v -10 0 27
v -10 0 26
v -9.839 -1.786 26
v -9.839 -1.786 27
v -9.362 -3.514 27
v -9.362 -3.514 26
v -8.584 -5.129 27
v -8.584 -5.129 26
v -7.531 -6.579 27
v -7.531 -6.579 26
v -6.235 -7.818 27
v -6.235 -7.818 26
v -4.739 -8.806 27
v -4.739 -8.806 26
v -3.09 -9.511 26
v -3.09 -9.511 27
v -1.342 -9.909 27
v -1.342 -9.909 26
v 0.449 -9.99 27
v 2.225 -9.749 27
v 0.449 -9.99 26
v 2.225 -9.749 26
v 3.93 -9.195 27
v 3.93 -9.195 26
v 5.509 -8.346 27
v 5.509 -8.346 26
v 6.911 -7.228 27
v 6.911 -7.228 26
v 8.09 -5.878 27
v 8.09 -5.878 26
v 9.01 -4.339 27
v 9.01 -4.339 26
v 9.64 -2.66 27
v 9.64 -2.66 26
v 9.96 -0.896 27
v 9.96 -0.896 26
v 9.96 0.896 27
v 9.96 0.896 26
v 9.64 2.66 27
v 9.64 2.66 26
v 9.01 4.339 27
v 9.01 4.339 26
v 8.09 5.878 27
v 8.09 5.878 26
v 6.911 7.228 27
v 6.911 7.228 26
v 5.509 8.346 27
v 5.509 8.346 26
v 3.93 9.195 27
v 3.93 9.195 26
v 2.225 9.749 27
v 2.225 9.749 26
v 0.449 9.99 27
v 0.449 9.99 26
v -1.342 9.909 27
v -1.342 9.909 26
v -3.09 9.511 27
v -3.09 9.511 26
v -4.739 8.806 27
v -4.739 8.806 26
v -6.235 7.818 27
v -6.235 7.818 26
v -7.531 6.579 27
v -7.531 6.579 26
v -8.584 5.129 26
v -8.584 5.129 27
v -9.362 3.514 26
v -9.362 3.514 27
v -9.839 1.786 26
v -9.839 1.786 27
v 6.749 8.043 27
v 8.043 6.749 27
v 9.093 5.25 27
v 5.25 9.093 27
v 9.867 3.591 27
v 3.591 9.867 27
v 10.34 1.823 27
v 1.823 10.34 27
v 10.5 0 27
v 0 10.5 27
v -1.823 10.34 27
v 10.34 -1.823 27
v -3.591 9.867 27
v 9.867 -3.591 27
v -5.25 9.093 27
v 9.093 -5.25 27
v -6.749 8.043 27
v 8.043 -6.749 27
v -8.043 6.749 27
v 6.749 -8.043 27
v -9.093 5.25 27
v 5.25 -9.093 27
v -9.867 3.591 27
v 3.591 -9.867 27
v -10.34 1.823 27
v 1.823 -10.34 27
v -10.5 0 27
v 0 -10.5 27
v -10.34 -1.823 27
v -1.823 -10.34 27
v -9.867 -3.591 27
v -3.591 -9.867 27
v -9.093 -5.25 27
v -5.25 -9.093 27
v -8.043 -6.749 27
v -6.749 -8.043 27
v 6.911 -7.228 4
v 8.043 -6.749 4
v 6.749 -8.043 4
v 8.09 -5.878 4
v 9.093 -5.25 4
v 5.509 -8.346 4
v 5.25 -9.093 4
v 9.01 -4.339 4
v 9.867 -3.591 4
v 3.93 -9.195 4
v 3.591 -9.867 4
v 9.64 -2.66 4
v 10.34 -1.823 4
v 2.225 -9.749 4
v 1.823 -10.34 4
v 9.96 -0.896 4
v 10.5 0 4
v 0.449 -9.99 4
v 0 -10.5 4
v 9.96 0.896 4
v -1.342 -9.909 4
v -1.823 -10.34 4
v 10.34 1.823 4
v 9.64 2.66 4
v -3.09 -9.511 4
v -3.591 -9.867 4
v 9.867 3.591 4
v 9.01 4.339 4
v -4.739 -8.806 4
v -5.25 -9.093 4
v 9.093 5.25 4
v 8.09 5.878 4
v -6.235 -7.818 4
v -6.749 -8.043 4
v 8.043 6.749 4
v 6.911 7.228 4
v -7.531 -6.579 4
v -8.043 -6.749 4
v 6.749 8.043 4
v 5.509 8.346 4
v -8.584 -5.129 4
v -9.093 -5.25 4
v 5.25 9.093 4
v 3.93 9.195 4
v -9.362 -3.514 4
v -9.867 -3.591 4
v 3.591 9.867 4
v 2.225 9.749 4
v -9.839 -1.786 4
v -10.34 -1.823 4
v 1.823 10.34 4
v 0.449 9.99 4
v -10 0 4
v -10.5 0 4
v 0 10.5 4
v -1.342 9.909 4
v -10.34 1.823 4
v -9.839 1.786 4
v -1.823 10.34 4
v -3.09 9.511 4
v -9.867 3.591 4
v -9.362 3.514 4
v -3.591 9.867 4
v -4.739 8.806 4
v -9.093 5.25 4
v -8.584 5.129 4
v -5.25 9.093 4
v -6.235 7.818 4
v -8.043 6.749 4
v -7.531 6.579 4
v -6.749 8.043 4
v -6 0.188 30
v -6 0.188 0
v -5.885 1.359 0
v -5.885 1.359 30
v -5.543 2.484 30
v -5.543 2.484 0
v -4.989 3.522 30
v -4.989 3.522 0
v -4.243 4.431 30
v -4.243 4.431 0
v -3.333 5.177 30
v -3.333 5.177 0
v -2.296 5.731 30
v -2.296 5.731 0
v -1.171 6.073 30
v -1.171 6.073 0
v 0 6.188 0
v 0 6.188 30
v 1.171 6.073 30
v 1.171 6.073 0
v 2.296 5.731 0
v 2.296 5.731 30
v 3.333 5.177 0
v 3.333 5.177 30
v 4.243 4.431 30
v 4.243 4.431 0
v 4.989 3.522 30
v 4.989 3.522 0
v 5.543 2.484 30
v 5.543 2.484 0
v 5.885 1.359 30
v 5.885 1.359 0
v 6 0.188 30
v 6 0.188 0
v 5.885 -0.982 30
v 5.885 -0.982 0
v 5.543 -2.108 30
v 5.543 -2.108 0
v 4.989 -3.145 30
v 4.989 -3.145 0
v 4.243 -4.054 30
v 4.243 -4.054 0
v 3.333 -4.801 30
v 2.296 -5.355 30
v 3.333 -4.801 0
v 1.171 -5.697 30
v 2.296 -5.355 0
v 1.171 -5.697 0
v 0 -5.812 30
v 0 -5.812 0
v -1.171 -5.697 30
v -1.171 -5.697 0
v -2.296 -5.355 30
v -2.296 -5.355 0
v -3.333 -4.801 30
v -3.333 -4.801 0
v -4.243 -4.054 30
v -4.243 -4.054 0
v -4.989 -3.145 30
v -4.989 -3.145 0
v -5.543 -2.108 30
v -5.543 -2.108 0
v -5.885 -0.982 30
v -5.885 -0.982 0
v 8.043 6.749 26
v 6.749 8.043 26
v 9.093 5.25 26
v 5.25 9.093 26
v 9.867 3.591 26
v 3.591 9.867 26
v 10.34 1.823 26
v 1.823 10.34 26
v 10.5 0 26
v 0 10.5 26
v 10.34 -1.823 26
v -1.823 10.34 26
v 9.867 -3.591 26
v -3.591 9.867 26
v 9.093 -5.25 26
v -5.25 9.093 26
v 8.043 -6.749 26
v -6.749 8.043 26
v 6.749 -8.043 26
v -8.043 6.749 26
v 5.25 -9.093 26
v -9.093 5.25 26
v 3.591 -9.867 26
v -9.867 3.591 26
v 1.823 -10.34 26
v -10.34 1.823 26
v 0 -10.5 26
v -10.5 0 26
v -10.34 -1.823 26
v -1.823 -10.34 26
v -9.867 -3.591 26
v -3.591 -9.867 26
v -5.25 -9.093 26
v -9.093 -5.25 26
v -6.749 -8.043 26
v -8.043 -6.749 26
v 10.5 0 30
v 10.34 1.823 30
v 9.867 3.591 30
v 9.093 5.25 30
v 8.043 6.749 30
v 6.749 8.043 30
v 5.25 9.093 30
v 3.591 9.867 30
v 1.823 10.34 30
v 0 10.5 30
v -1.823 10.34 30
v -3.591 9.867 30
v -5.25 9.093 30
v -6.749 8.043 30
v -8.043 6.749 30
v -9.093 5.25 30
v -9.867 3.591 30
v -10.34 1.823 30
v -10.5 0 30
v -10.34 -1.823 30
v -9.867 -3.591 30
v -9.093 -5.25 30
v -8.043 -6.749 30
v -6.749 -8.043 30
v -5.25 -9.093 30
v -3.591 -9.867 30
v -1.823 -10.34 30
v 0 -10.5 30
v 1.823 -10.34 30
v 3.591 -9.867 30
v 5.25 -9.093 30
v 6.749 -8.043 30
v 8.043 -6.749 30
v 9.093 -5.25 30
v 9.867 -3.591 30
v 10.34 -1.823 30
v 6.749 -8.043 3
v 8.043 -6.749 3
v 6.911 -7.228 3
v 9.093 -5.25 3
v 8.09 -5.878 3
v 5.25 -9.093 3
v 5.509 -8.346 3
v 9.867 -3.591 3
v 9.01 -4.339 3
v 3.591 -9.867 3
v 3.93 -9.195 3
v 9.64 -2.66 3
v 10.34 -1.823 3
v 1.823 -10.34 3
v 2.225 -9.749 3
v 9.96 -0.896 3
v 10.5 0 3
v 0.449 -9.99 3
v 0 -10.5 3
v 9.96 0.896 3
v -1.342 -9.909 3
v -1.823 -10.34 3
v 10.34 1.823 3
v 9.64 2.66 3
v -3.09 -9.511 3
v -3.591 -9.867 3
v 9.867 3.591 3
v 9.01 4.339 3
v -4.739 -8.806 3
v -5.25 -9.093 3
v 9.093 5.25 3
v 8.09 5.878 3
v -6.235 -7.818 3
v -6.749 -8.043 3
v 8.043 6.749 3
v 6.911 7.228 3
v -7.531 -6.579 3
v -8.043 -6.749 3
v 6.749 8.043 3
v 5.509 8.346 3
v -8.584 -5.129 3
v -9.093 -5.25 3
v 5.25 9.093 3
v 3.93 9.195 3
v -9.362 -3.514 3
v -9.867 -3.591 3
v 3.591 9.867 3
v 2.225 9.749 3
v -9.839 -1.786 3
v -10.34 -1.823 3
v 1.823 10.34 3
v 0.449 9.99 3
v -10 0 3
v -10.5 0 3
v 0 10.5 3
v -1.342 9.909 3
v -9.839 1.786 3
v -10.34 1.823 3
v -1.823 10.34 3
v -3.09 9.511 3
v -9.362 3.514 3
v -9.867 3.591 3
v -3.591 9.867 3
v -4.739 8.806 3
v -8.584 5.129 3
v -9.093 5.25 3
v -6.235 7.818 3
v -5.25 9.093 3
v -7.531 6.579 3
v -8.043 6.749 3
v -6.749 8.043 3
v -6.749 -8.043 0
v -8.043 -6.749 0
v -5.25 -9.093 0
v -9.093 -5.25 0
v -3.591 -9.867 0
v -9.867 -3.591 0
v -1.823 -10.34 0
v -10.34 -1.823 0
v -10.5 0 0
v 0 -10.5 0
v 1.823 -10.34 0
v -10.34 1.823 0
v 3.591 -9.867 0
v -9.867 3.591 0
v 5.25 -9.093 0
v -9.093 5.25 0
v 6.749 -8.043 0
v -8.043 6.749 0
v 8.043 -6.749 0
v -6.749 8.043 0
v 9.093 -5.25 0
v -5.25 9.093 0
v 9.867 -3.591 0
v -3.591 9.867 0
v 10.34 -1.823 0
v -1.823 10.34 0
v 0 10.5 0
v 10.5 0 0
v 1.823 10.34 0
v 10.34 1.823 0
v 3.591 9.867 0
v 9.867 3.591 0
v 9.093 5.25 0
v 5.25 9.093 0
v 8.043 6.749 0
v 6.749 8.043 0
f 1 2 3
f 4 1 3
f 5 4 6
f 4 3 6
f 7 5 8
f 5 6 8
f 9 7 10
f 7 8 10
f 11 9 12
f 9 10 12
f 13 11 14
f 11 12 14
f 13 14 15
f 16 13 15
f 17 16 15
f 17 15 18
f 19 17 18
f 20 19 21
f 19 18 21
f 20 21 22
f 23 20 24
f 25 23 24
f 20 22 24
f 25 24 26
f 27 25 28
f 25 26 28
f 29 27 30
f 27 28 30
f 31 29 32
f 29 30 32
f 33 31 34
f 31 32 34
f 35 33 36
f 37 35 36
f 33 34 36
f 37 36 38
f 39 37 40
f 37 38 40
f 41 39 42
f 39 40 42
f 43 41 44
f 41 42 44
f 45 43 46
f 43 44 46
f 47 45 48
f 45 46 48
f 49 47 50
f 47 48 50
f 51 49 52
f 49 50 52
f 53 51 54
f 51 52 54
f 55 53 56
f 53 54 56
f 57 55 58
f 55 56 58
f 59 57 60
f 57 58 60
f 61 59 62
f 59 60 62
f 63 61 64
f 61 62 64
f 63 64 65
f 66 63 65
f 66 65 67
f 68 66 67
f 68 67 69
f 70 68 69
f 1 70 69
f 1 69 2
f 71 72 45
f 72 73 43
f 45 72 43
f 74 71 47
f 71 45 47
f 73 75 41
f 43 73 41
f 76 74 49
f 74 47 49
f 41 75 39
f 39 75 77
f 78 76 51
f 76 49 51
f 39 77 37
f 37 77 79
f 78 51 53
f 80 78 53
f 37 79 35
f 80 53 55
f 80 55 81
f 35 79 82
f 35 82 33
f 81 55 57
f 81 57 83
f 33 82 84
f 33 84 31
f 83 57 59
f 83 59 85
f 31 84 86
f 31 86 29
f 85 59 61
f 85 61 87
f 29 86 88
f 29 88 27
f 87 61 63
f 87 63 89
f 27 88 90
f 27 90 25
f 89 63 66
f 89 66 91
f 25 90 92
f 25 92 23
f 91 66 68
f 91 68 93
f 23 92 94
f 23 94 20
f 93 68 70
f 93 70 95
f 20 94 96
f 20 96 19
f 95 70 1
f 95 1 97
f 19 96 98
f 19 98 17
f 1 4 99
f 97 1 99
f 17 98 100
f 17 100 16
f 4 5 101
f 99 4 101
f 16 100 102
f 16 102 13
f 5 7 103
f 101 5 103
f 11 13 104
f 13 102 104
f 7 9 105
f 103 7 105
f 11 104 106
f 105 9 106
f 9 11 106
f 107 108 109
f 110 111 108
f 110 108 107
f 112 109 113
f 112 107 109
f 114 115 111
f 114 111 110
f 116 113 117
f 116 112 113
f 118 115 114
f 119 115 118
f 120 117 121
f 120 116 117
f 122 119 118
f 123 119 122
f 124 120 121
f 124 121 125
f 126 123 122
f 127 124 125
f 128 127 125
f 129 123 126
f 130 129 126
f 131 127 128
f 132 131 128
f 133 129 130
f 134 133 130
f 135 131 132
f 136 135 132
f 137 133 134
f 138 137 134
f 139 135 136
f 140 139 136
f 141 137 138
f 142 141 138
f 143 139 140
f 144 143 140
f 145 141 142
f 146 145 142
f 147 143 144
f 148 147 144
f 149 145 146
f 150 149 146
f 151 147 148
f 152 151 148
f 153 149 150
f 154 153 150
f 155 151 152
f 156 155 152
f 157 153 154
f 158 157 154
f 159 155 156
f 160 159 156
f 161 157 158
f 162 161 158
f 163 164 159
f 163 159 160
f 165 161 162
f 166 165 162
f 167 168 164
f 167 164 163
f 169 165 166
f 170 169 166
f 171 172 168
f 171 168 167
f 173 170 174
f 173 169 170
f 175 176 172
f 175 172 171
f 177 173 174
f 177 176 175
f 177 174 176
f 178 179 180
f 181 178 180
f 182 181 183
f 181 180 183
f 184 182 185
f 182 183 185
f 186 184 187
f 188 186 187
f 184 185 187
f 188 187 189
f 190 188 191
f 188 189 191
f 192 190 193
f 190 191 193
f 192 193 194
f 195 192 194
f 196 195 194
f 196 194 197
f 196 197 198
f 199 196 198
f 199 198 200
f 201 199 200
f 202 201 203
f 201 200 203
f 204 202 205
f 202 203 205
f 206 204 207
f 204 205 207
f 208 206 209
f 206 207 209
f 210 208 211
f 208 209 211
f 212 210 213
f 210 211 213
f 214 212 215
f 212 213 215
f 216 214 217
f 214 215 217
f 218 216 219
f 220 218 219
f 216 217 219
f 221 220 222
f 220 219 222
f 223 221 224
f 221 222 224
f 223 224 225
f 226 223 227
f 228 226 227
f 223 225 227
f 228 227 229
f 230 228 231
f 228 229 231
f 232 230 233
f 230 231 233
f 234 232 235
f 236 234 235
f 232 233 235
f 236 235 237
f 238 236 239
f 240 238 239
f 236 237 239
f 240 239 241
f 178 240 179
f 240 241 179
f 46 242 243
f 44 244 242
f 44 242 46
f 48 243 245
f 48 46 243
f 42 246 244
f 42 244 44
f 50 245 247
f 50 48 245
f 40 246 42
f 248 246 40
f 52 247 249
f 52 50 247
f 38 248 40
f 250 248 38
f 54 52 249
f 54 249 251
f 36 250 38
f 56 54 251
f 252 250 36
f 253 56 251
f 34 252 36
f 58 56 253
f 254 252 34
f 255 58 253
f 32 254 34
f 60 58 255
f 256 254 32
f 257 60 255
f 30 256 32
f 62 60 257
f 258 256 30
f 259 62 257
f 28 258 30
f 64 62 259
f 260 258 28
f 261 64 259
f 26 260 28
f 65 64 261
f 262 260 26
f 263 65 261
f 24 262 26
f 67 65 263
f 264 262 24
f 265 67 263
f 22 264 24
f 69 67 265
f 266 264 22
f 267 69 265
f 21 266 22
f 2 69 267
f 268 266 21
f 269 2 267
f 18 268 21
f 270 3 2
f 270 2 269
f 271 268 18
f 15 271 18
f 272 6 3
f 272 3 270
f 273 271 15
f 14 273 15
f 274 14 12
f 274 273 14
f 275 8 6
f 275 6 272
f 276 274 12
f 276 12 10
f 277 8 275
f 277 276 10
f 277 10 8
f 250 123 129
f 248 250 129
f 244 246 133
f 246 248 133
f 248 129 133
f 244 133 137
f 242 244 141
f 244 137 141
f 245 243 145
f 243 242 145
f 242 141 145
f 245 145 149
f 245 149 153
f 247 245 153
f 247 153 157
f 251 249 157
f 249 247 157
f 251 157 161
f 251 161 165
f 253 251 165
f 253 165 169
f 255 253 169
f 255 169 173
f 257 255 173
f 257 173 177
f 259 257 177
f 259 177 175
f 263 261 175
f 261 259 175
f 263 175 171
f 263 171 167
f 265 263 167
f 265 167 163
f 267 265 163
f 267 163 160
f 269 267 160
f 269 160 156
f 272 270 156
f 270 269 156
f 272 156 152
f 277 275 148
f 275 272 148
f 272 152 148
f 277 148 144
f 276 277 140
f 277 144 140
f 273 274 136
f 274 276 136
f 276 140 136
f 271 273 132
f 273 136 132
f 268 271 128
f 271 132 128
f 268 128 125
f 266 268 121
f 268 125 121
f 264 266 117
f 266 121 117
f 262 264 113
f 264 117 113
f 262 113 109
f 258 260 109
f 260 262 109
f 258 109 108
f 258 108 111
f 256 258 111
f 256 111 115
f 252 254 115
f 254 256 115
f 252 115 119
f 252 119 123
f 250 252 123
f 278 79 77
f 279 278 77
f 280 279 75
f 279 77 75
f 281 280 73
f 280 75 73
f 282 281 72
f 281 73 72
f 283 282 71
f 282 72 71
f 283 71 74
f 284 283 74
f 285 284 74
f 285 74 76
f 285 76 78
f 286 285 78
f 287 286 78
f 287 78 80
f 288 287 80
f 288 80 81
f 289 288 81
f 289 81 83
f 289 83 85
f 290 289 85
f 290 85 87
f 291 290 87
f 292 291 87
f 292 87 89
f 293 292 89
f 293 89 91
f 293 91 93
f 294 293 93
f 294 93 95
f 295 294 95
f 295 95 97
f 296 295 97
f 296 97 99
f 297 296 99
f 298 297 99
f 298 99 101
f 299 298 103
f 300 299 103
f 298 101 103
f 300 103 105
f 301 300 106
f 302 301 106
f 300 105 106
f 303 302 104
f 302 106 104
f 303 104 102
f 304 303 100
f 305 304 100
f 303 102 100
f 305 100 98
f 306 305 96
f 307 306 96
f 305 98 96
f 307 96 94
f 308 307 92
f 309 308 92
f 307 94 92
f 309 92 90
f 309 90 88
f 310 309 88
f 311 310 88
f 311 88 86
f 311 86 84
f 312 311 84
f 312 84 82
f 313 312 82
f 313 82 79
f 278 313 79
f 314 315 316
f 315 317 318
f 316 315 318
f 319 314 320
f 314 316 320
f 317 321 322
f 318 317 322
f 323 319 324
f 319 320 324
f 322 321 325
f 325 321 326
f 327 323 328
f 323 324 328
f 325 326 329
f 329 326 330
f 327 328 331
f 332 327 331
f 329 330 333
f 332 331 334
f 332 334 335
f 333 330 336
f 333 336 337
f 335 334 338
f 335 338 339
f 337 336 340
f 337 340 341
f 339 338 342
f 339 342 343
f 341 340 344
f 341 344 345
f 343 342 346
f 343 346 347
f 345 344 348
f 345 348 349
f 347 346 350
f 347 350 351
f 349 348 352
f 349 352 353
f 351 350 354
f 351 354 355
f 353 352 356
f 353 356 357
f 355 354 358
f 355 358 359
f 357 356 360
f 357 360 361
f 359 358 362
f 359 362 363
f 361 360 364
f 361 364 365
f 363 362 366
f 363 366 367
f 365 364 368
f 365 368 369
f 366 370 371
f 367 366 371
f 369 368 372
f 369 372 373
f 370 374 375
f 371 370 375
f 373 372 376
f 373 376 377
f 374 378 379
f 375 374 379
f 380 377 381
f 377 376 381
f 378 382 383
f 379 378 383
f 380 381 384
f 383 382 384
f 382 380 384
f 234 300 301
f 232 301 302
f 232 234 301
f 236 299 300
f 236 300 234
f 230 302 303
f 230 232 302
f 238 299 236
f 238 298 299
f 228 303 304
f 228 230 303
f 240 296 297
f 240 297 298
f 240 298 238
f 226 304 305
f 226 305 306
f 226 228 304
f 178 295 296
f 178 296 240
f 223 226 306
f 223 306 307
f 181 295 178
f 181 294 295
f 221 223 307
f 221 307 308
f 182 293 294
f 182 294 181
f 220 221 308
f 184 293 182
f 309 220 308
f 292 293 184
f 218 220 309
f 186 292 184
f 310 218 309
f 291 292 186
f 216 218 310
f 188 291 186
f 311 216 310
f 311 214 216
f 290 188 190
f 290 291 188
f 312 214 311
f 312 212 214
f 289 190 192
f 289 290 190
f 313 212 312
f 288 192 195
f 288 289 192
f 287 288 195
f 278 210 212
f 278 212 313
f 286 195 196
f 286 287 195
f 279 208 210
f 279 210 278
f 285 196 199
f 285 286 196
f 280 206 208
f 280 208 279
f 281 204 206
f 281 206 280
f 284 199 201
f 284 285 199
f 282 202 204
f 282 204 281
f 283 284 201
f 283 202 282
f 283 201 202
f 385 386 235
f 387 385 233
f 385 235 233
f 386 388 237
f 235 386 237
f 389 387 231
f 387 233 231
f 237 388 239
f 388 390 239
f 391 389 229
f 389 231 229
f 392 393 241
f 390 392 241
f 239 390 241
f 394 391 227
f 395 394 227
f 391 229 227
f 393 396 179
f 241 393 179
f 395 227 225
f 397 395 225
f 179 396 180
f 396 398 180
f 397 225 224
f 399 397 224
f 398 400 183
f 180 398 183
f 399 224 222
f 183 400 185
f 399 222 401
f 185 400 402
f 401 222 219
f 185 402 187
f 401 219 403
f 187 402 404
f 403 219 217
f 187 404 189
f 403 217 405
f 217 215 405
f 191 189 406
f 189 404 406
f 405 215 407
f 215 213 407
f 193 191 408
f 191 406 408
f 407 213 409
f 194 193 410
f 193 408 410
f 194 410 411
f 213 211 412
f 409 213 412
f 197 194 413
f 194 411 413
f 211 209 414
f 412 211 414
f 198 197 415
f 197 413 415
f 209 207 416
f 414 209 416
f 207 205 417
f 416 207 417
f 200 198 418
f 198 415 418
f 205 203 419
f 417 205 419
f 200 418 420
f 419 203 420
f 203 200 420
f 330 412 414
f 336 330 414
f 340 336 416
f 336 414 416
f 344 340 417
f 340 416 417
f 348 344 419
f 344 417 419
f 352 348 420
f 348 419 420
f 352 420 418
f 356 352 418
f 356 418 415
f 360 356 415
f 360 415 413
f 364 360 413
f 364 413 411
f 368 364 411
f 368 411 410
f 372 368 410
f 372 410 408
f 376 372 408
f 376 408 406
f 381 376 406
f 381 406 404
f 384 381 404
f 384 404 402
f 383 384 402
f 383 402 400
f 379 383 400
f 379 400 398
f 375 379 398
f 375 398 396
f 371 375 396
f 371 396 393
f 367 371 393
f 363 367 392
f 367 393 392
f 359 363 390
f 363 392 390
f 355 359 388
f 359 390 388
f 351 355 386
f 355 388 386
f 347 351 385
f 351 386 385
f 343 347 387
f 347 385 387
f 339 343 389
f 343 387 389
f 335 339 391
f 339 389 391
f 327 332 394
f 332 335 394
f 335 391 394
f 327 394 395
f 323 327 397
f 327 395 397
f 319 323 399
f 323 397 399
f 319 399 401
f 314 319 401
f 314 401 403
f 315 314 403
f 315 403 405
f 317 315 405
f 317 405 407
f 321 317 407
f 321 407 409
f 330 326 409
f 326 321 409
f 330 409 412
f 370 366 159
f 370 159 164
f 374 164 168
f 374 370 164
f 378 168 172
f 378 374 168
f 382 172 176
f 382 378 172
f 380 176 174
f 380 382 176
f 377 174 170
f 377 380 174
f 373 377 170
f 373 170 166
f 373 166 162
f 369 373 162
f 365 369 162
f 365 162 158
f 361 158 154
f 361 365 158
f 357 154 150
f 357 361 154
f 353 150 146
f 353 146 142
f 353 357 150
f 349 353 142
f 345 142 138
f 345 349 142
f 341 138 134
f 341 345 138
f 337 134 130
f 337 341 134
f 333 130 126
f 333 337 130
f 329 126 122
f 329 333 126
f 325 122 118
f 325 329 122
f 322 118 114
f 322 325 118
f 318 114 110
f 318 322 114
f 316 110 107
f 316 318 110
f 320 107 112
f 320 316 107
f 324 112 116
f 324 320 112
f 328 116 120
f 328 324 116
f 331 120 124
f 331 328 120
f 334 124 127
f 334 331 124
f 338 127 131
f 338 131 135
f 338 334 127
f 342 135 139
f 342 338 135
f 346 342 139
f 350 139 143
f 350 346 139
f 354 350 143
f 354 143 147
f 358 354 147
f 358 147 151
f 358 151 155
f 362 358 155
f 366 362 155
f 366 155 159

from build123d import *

# Parameters (mm, degrees)
SKETCH1_R           = 10.5
BOSS_EXTRUDE1_DEPTH = 30
SKETCH2_R           = 6
CUT_EXTRUDE1_DEPTH  = 30
CUT_EXTRUDE2_START  = -3
SKETCH3_R           = 10.5
SKETCH3_R_2         = 10
CUT_EXTRUDE2_DEPTH  = 1
CUT_EXTRUDE3_START  = -4
SKETCH4_R           = 10.5
SKETCH4_R_2         = 10
CUT_EXTRUDE3_DEPTH  = 1


with BuildPart() as part:
    # Sketch1 → Boss-Extrude1 (new body)
    with BuildSketch(Plane.XY):
        Circle(SKETCH1_R)
    extrude(amount=BOSS_EXTRUDE1_DEPTH)

    # Sketch2 → Cut-Extrude1 (cut)
    with BuildSketch(Plane(origin=(0, 0, 0), x_dir=(-1, 0, 0), z_dir=(0, 0, -1))):
        with Locations((0, 0.188162924)):
            Circle(SKETCH2_R)
    extrude(amount=-CUT_EXTRUDE1_DEPTH, mode=Mode.SUBTRACT)

    # Sketch3 → Cut-Extrude2 (cut)
    with BuildSketch(Plane(origin=(0, 0, 0), x_dir=(-1, 0, 0), z_dir=(0, 0, -1)).offset(CUT_EXTRUDE2_START)):
        Circle(SKETCH3_R)
        Circle(SKETCH3_R_2, mode=Mode.SUBTRACT)
    extrude(amount=-CUT_EXTRUDE2_DEPTH, mode=Mode.SUBTRACT)

    # Sketch4 → Cut-Extrude3 (cut)
    with BuildSketch(Plane.XY.offset(30).offset(CUT_EXTRUDE3_START)):
        with Locations(Location((0, 0, 0), (0, 0, 180))):
            Circle(SKETCH4_R)
        with Locations(Location((0, 0, 0), (0, 0, 180))):
            Circle(SKETCH4_R_2, mode=Mode.SUBTRACT)
    extrude(amount=CUT_EXTRUDE3_DEPTH, mode=Mode.SUBTRACT)


solid = part.part
